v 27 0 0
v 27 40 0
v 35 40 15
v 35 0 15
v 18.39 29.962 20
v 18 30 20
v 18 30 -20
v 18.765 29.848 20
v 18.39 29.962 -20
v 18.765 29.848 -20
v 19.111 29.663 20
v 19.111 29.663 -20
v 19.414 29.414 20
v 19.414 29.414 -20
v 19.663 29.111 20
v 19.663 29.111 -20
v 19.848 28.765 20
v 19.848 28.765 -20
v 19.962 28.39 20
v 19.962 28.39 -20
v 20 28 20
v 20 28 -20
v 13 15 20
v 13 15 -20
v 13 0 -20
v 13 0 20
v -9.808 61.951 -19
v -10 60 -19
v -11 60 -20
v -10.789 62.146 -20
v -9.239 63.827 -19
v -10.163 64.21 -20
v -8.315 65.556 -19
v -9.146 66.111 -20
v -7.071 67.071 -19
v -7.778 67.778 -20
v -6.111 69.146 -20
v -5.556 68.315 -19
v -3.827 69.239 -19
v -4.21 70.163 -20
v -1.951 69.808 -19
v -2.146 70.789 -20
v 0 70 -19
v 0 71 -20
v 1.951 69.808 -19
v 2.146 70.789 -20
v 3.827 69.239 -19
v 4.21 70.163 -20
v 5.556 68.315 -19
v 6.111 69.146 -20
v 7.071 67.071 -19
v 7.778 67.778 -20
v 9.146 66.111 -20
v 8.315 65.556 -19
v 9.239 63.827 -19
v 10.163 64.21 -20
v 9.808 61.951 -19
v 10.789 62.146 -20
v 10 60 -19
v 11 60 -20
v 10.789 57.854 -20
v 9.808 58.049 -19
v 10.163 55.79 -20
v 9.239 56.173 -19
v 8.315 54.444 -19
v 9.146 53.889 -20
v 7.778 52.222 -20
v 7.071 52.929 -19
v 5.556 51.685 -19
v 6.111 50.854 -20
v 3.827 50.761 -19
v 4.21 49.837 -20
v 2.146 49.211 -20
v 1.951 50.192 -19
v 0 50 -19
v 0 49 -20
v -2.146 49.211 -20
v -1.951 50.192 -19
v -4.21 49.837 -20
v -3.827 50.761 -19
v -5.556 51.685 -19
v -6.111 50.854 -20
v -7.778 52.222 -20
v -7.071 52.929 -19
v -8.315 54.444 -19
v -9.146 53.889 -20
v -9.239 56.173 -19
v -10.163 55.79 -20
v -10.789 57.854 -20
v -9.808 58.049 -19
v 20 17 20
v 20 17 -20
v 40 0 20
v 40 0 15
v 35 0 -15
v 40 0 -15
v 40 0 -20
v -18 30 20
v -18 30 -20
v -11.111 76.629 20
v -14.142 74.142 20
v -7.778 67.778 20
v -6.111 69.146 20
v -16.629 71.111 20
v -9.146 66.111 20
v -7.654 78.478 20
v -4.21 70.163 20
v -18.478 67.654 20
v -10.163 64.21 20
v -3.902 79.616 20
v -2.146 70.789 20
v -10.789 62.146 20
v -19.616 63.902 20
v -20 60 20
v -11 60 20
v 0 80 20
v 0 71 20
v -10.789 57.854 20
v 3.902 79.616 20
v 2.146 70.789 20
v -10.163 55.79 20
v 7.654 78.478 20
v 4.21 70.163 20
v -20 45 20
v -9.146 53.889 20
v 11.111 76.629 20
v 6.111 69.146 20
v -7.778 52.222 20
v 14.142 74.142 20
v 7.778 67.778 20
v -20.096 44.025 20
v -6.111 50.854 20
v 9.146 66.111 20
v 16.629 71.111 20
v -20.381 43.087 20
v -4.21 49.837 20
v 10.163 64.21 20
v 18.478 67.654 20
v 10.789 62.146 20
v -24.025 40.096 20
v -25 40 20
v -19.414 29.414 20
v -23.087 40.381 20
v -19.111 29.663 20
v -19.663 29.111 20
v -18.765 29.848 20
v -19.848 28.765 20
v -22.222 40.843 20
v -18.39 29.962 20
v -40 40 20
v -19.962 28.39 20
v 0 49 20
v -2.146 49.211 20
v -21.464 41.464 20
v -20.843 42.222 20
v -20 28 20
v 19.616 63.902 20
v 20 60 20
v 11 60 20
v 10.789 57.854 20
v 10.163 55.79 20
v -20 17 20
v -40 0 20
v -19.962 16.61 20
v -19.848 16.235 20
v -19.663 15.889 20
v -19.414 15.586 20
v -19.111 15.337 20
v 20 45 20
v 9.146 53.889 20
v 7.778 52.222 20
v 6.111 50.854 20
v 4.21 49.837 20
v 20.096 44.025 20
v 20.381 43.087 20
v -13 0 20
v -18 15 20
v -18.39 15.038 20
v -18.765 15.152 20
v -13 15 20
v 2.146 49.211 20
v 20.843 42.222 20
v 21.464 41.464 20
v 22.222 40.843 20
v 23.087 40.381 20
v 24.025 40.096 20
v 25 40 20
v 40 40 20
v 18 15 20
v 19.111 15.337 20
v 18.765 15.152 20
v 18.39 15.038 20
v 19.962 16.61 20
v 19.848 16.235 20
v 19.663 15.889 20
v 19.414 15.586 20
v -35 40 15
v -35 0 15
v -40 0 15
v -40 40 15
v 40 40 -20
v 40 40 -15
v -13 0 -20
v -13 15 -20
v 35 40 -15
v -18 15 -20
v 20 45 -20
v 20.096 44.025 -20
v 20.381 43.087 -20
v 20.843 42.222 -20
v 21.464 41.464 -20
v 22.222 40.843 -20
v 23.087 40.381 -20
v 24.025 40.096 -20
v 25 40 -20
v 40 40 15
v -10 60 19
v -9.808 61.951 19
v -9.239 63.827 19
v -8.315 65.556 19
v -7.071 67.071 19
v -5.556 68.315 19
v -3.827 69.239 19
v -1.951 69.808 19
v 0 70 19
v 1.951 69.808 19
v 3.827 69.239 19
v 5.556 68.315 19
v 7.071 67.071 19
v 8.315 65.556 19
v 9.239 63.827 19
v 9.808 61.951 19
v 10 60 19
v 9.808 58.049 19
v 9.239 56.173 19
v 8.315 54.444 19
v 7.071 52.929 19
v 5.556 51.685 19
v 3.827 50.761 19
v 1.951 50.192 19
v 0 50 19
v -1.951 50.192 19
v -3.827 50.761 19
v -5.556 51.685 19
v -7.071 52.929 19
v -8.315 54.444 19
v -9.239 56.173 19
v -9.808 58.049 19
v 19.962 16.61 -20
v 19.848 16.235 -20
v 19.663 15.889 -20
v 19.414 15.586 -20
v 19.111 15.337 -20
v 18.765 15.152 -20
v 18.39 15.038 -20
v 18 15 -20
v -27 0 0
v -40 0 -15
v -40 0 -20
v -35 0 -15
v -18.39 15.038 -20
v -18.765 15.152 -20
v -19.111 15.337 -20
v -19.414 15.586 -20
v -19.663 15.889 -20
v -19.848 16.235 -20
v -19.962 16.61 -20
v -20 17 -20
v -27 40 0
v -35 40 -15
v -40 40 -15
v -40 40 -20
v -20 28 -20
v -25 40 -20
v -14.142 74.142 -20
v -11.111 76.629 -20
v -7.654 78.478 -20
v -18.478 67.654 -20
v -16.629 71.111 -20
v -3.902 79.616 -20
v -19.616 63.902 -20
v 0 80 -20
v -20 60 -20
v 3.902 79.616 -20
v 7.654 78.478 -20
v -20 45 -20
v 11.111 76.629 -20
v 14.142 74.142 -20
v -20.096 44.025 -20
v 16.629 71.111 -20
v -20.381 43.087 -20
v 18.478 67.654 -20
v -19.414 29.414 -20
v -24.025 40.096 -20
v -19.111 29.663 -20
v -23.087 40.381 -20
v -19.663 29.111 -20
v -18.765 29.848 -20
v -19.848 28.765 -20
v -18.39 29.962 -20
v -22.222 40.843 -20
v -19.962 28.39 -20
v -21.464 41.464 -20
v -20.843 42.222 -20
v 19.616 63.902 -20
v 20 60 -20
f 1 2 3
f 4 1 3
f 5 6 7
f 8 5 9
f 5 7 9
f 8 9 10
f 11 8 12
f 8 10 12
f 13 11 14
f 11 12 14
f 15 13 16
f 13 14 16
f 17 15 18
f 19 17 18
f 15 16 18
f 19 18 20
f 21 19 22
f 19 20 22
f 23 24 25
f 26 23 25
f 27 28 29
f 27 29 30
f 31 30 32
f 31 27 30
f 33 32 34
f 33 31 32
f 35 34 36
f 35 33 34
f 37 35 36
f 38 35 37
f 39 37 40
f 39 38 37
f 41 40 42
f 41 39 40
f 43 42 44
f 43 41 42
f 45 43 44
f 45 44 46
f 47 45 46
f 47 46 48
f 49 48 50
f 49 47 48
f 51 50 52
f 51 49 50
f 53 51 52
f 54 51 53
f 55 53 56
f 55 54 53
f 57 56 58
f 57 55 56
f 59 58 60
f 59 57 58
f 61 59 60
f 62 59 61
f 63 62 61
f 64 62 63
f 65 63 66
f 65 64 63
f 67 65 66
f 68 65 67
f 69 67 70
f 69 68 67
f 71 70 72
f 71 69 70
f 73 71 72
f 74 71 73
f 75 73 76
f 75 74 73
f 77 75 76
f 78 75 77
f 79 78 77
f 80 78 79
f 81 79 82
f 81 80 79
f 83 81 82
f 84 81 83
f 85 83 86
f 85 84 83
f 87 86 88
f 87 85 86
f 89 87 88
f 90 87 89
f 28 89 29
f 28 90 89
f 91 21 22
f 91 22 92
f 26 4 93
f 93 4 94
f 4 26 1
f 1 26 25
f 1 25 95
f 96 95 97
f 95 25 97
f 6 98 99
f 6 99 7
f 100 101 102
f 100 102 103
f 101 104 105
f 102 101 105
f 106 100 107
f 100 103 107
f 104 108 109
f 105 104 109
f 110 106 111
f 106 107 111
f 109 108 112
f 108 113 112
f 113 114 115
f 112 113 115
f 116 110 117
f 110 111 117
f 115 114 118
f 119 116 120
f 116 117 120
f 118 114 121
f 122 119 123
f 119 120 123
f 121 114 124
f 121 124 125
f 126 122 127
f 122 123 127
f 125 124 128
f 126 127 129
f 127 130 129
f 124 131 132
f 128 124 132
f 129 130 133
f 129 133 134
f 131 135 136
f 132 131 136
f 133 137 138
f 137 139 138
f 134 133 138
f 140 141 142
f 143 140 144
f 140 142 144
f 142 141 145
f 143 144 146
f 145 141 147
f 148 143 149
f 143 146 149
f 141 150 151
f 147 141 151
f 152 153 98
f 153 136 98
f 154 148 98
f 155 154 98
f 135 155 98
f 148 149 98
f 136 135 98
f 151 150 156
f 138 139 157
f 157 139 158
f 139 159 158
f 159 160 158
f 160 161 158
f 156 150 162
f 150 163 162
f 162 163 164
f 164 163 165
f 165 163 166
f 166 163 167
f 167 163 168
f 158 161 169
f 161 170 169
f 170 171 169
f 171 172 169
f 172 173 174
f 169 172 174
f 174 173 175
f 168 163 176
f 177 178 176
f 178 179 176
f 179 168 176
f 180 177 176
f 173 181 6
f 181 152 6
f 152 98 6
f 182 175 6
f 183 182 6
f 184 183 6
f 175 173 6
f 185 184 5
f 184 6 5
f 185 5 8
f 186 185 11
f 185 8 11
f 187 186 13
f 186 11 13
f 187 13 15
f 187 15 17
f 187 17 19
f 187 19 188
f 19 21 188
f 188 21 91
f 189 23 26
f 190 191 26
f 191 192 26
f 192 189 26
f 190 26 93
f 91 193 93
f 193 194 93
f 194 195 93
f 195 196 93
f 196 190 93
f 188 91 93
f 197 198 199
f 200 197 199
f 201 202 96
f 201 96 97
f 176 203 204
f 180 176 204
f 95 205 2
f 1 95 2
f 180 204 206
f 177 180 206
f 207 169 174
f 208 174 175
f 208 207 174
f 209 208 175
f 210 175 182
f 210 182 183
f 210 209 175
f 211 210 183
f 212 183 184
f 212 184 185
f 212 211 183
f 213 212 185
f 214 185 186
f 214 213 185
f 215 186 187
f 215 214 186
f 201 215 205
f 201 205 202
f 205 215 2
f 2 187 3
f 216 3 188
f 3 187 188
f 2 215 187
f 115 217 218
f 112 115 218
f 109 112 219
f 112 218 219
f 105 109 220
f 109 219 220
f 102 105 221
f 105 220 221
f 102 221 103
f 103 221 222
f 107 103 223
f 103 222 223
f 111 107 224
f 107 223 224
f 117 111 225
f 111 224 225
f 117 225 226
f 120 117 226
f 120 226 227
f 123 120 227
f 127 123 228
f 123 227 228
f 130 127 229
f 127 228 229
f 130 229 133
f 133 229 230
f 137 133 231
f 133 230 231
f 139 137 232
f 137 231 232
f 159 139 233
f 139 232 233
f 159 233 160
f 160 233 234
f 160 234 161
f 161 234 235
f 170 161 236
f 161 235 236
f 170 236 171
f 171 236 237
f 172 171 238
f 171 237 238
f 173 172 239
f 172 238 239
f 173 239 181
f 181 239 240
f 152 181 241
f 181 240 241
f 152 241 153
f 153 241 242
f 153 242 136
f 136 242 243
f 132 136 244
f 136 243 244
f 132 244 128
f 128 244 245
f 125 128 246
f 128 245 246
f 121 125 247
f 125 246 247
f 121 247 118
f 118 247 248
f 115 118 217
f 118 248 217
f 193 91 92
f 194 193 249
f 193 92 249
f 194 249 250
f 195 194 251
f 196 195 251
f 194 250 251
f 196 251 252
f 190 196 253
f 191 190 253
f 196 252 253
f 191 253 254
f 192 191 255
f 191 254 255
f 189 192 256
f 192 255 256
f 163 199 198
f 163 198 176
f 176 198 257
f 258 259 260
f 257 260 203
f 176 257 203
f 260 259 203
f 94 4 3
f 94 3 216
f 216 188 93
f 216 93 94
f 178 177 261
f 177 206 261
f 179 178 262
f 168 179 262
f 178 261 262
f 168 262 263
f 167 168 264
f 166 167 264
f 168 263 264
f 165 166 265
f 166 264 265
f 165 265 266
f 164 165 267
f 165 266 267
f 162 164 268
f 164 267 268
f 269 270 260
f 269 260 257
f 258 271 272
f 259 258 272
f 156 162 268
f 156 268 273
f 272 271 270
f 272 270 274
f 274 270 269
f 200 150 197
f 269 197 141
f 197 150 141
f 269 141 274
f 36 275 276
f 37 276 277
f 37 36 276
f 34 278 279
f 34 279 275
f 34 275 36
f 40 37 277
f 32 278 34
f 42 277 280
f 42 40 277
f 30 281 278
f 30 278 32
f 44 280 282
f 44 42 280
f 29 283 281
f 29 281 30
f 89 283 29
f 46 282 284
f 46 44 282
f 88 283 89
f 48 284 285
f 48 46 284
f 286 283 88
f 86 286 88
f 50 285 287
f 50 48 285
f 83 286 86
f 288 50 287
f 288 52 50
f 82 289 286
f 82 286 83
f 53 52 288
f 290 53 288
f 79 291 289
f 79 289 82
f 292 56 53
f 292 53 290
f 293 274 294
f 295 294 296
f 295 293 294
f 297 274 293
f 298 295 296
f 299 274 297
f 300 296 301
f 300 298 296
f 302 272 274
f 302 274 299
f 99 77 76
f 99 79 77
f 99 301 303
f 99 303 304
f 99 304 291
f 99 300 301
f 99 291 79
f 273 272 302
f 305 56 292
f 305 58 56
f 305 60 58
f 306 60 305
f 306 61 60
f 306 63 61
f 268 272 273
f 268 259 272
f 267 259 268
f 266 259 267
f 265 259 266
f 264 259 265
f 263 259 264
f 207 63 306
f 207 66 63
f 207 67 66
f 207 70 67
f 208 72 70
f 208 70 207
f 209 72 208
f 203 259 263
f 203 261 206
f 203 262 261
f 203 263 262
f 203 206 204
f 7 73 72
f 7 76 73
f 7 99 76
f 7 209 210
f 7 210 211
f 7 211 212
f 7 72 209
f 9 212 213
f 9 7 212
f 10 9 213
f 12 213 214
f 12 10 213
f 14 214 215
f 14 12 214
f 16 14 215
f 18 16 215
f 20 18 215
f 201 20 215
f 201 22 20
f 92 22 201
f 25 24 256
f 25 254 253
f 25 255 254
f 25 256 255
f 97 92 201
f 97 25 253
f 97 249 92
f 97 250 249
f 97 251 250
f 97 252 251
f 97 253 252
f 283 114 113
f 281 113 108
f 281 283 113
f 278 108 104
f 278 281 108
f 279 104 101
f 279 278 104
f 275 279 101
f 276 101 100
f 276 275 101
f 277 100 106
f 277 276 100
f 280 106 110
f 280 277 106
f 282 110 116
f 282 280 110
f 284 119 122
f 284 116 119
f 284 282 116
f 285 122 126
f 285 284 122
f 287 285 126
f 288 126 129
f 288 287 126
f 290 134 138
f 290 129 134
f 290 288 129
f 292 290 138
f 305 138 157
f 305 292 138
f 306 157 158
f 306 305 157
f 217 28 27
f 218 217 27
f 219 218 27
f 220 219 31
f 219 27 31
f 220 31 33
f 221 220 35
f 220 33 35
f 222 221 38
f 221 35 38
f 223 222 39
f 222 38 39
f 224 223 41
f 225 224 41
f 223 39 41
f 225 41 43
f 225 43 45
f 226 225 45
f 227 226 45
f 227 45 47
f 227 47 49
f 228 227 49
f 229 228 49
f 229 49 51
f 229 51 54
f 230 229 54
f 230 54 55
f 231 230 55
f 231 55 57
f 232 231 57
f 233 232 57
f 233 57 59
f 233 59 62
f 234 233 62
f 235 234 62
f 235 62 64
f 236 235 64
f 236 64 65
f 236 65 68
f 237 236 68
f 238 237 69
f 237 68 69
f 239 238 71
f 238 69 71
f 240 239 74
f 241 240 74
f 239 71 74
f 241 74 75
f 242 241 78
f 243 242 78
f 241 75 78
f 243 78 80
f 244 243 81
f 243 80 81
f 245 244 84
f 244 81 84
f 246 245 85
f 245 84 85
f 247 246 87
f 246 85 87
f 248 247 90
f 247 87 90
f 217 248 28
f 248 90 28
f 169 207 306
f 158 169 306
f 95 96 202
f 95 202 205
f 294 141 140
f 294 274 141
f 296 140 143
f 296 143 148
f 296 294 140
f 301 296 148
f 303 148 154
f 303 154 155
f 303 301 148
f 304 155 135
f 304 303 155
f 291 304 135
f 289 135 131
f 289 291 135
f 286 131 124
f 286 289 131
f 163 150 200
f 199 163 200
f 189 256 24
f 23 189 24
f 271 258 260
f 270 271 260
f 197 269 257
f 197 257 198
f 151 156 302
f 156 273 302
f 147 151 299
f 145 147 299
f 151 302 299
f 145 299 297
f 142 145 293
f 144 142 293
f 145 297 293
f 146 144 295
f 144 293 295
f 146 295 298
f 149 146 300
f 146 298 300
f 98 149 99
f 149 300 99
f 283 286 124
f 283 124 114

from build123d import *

# Parameters (mm, degrees)
ESBO_O1_W                    = 80
ESBO_O1_H                    = 40
RESSALTO_EXTRUS_O1_DEPTH     = 80
ESBO_O2_W                    = 20
ESBO_O2_H                    = 40
CORTE_EXTRUS_O1_DEPTH        = 80
FILETE1_RADIUS               = 20
FILETE1_LENGTH               = 40
FURO_DE_DI_METRO_20_0_20_1_D = 20
CHANFRO1_SIZE                = 1
CORTE_EXTRUS_O2_DEPTH        = 80
CORTE_EXTRUS_O3_DEPTH        = 80
FILETE2_R                    = 2
FILETE3_R                    = 5


with BuildPart() as part:
    # Esboço1 → Ressalto-extrusão1 (new body)
    with BuildSketch(Plane(origin=(0, 0, 0), x_dir=(1, 0, 0), z_dir=(0, 1, 0))):
        Rectangle(ESBO_O1_W, ESBO_O1_H)
    extrude(amount=RESSALTO_EXTRUS_O1_DEPTH)

    # Esboço2 → Corte-extrusão1 (cut)
    with BuildSketch(Plane.XY.offset(20)):
        with Locations((-30, 60)):
            Rectangle(ESBO_O2_W, ESBO_O2_H)
        with Locations((30, 60)):
            Rectangle(ESBO_O2_W, ESBO_O2_H)
    extrude(amount=-CORTE_EXTRUS_O1_DEPTH, mode=Mode.SUBTRACT)

    # Filete1: full round fillet: the end face becomes a half cylinder, R = half its width
    filete1_face = Plane((0, 80, 0), x_dir=(0, 0, -1), z_dir=(0, 1, 0))  # on the end face: x along it, z out of the body
    filete1_slab = filete1_face.offset(-FILETE1_RADIUS / 2) * Box(FILETE1_LENGTH, 2 * FILETE1_RADIUS, FILETE1_RADIUS, mode=Mode.PRIVATE)  # the body's end, R deep
    filete1_round = Plane((0, 60, 0), x_dir=(0, 1, 0), z_dir=(0, 0, -1)) * Cylinder(FILETE1_RADIUS, FILETE1_LENGTH, mode=Mode.PRIVATE)  # its axis R under the face
    add(filete1_slab - filete1_round, mode=Mode.SUBTRACT)

    # Furo de diâmetro Ø20.0 (20)1 (through all)
    with Locations(Plane.XY.offset(20)):
        with Locations((0, 60)):
            Hole(FURO_DE_DI_METRO_20_0_20_1_D / 2)

    # Chanfro1
    chanfro1_edges = [part.edges().sort_by_distance(p)[0] for p in [
        (10, 60, 20),
        (10, 60, -20),
    ]]
    chamfer(chanfro1_edges, length=CHANFRO1_SIZE)

    # Esboço5 → Corte-extrusão2 (cut)
    with BuildSketch(Plane(origin=(0, 40, 0), x_dir=(1, 0, 0), z_dir=(0, 1, 0))):
        Polygon((40, 15), (35, 15), (27, 0), (35, -15), (40, -15), align=None)
    corte_extrus_o2 = extrude(amount=-CORTE_EXTRUS_O2_DEPTH, mode=Mode.SUBTRACT)

    # Espelhar1: Corte-extrusão2 across plane
    add(corte_extrus_o2.mirror(Plane(origin=(0, 0, 0), x_dir=(0, 0, 1), z_dir=(1, 0, 0))), mode=Mode.SUBTRACT)

    # Esboço6 → Corte-extrusão3 (cut)
    with BuildSketch(Plane.XY.offset(20)):
        Polygon((-13, 0), (-13, 15), (-20, 15), (-20, 30), (20, 30), (20, 15), (13, 15), (13, 0), align=None)
    extrude(amount=-CORTE_EXTRUS_O3_DEPTH, mode=Mode.SUBTRACT)

    # Filete2
    filete2_edges = [part.edges().sort_by_distance(p)[0] for p in [
        (-20, 15, 0),
        (-20, 30, 0),
        (20, 30, 0),
        (20, 15, 0),
    ]]
    fillet(filete2_edges, radius=FILETE2_R)

    # Filete3
    filete3_edges = [part.edges().sort_by_distance(p)[0] for p in [
        (-20, 40, 0),
        (20, 40, 0),
    ]]
    fillet(filete3_edges, radius=FILETE3_R)


solid = part.part
